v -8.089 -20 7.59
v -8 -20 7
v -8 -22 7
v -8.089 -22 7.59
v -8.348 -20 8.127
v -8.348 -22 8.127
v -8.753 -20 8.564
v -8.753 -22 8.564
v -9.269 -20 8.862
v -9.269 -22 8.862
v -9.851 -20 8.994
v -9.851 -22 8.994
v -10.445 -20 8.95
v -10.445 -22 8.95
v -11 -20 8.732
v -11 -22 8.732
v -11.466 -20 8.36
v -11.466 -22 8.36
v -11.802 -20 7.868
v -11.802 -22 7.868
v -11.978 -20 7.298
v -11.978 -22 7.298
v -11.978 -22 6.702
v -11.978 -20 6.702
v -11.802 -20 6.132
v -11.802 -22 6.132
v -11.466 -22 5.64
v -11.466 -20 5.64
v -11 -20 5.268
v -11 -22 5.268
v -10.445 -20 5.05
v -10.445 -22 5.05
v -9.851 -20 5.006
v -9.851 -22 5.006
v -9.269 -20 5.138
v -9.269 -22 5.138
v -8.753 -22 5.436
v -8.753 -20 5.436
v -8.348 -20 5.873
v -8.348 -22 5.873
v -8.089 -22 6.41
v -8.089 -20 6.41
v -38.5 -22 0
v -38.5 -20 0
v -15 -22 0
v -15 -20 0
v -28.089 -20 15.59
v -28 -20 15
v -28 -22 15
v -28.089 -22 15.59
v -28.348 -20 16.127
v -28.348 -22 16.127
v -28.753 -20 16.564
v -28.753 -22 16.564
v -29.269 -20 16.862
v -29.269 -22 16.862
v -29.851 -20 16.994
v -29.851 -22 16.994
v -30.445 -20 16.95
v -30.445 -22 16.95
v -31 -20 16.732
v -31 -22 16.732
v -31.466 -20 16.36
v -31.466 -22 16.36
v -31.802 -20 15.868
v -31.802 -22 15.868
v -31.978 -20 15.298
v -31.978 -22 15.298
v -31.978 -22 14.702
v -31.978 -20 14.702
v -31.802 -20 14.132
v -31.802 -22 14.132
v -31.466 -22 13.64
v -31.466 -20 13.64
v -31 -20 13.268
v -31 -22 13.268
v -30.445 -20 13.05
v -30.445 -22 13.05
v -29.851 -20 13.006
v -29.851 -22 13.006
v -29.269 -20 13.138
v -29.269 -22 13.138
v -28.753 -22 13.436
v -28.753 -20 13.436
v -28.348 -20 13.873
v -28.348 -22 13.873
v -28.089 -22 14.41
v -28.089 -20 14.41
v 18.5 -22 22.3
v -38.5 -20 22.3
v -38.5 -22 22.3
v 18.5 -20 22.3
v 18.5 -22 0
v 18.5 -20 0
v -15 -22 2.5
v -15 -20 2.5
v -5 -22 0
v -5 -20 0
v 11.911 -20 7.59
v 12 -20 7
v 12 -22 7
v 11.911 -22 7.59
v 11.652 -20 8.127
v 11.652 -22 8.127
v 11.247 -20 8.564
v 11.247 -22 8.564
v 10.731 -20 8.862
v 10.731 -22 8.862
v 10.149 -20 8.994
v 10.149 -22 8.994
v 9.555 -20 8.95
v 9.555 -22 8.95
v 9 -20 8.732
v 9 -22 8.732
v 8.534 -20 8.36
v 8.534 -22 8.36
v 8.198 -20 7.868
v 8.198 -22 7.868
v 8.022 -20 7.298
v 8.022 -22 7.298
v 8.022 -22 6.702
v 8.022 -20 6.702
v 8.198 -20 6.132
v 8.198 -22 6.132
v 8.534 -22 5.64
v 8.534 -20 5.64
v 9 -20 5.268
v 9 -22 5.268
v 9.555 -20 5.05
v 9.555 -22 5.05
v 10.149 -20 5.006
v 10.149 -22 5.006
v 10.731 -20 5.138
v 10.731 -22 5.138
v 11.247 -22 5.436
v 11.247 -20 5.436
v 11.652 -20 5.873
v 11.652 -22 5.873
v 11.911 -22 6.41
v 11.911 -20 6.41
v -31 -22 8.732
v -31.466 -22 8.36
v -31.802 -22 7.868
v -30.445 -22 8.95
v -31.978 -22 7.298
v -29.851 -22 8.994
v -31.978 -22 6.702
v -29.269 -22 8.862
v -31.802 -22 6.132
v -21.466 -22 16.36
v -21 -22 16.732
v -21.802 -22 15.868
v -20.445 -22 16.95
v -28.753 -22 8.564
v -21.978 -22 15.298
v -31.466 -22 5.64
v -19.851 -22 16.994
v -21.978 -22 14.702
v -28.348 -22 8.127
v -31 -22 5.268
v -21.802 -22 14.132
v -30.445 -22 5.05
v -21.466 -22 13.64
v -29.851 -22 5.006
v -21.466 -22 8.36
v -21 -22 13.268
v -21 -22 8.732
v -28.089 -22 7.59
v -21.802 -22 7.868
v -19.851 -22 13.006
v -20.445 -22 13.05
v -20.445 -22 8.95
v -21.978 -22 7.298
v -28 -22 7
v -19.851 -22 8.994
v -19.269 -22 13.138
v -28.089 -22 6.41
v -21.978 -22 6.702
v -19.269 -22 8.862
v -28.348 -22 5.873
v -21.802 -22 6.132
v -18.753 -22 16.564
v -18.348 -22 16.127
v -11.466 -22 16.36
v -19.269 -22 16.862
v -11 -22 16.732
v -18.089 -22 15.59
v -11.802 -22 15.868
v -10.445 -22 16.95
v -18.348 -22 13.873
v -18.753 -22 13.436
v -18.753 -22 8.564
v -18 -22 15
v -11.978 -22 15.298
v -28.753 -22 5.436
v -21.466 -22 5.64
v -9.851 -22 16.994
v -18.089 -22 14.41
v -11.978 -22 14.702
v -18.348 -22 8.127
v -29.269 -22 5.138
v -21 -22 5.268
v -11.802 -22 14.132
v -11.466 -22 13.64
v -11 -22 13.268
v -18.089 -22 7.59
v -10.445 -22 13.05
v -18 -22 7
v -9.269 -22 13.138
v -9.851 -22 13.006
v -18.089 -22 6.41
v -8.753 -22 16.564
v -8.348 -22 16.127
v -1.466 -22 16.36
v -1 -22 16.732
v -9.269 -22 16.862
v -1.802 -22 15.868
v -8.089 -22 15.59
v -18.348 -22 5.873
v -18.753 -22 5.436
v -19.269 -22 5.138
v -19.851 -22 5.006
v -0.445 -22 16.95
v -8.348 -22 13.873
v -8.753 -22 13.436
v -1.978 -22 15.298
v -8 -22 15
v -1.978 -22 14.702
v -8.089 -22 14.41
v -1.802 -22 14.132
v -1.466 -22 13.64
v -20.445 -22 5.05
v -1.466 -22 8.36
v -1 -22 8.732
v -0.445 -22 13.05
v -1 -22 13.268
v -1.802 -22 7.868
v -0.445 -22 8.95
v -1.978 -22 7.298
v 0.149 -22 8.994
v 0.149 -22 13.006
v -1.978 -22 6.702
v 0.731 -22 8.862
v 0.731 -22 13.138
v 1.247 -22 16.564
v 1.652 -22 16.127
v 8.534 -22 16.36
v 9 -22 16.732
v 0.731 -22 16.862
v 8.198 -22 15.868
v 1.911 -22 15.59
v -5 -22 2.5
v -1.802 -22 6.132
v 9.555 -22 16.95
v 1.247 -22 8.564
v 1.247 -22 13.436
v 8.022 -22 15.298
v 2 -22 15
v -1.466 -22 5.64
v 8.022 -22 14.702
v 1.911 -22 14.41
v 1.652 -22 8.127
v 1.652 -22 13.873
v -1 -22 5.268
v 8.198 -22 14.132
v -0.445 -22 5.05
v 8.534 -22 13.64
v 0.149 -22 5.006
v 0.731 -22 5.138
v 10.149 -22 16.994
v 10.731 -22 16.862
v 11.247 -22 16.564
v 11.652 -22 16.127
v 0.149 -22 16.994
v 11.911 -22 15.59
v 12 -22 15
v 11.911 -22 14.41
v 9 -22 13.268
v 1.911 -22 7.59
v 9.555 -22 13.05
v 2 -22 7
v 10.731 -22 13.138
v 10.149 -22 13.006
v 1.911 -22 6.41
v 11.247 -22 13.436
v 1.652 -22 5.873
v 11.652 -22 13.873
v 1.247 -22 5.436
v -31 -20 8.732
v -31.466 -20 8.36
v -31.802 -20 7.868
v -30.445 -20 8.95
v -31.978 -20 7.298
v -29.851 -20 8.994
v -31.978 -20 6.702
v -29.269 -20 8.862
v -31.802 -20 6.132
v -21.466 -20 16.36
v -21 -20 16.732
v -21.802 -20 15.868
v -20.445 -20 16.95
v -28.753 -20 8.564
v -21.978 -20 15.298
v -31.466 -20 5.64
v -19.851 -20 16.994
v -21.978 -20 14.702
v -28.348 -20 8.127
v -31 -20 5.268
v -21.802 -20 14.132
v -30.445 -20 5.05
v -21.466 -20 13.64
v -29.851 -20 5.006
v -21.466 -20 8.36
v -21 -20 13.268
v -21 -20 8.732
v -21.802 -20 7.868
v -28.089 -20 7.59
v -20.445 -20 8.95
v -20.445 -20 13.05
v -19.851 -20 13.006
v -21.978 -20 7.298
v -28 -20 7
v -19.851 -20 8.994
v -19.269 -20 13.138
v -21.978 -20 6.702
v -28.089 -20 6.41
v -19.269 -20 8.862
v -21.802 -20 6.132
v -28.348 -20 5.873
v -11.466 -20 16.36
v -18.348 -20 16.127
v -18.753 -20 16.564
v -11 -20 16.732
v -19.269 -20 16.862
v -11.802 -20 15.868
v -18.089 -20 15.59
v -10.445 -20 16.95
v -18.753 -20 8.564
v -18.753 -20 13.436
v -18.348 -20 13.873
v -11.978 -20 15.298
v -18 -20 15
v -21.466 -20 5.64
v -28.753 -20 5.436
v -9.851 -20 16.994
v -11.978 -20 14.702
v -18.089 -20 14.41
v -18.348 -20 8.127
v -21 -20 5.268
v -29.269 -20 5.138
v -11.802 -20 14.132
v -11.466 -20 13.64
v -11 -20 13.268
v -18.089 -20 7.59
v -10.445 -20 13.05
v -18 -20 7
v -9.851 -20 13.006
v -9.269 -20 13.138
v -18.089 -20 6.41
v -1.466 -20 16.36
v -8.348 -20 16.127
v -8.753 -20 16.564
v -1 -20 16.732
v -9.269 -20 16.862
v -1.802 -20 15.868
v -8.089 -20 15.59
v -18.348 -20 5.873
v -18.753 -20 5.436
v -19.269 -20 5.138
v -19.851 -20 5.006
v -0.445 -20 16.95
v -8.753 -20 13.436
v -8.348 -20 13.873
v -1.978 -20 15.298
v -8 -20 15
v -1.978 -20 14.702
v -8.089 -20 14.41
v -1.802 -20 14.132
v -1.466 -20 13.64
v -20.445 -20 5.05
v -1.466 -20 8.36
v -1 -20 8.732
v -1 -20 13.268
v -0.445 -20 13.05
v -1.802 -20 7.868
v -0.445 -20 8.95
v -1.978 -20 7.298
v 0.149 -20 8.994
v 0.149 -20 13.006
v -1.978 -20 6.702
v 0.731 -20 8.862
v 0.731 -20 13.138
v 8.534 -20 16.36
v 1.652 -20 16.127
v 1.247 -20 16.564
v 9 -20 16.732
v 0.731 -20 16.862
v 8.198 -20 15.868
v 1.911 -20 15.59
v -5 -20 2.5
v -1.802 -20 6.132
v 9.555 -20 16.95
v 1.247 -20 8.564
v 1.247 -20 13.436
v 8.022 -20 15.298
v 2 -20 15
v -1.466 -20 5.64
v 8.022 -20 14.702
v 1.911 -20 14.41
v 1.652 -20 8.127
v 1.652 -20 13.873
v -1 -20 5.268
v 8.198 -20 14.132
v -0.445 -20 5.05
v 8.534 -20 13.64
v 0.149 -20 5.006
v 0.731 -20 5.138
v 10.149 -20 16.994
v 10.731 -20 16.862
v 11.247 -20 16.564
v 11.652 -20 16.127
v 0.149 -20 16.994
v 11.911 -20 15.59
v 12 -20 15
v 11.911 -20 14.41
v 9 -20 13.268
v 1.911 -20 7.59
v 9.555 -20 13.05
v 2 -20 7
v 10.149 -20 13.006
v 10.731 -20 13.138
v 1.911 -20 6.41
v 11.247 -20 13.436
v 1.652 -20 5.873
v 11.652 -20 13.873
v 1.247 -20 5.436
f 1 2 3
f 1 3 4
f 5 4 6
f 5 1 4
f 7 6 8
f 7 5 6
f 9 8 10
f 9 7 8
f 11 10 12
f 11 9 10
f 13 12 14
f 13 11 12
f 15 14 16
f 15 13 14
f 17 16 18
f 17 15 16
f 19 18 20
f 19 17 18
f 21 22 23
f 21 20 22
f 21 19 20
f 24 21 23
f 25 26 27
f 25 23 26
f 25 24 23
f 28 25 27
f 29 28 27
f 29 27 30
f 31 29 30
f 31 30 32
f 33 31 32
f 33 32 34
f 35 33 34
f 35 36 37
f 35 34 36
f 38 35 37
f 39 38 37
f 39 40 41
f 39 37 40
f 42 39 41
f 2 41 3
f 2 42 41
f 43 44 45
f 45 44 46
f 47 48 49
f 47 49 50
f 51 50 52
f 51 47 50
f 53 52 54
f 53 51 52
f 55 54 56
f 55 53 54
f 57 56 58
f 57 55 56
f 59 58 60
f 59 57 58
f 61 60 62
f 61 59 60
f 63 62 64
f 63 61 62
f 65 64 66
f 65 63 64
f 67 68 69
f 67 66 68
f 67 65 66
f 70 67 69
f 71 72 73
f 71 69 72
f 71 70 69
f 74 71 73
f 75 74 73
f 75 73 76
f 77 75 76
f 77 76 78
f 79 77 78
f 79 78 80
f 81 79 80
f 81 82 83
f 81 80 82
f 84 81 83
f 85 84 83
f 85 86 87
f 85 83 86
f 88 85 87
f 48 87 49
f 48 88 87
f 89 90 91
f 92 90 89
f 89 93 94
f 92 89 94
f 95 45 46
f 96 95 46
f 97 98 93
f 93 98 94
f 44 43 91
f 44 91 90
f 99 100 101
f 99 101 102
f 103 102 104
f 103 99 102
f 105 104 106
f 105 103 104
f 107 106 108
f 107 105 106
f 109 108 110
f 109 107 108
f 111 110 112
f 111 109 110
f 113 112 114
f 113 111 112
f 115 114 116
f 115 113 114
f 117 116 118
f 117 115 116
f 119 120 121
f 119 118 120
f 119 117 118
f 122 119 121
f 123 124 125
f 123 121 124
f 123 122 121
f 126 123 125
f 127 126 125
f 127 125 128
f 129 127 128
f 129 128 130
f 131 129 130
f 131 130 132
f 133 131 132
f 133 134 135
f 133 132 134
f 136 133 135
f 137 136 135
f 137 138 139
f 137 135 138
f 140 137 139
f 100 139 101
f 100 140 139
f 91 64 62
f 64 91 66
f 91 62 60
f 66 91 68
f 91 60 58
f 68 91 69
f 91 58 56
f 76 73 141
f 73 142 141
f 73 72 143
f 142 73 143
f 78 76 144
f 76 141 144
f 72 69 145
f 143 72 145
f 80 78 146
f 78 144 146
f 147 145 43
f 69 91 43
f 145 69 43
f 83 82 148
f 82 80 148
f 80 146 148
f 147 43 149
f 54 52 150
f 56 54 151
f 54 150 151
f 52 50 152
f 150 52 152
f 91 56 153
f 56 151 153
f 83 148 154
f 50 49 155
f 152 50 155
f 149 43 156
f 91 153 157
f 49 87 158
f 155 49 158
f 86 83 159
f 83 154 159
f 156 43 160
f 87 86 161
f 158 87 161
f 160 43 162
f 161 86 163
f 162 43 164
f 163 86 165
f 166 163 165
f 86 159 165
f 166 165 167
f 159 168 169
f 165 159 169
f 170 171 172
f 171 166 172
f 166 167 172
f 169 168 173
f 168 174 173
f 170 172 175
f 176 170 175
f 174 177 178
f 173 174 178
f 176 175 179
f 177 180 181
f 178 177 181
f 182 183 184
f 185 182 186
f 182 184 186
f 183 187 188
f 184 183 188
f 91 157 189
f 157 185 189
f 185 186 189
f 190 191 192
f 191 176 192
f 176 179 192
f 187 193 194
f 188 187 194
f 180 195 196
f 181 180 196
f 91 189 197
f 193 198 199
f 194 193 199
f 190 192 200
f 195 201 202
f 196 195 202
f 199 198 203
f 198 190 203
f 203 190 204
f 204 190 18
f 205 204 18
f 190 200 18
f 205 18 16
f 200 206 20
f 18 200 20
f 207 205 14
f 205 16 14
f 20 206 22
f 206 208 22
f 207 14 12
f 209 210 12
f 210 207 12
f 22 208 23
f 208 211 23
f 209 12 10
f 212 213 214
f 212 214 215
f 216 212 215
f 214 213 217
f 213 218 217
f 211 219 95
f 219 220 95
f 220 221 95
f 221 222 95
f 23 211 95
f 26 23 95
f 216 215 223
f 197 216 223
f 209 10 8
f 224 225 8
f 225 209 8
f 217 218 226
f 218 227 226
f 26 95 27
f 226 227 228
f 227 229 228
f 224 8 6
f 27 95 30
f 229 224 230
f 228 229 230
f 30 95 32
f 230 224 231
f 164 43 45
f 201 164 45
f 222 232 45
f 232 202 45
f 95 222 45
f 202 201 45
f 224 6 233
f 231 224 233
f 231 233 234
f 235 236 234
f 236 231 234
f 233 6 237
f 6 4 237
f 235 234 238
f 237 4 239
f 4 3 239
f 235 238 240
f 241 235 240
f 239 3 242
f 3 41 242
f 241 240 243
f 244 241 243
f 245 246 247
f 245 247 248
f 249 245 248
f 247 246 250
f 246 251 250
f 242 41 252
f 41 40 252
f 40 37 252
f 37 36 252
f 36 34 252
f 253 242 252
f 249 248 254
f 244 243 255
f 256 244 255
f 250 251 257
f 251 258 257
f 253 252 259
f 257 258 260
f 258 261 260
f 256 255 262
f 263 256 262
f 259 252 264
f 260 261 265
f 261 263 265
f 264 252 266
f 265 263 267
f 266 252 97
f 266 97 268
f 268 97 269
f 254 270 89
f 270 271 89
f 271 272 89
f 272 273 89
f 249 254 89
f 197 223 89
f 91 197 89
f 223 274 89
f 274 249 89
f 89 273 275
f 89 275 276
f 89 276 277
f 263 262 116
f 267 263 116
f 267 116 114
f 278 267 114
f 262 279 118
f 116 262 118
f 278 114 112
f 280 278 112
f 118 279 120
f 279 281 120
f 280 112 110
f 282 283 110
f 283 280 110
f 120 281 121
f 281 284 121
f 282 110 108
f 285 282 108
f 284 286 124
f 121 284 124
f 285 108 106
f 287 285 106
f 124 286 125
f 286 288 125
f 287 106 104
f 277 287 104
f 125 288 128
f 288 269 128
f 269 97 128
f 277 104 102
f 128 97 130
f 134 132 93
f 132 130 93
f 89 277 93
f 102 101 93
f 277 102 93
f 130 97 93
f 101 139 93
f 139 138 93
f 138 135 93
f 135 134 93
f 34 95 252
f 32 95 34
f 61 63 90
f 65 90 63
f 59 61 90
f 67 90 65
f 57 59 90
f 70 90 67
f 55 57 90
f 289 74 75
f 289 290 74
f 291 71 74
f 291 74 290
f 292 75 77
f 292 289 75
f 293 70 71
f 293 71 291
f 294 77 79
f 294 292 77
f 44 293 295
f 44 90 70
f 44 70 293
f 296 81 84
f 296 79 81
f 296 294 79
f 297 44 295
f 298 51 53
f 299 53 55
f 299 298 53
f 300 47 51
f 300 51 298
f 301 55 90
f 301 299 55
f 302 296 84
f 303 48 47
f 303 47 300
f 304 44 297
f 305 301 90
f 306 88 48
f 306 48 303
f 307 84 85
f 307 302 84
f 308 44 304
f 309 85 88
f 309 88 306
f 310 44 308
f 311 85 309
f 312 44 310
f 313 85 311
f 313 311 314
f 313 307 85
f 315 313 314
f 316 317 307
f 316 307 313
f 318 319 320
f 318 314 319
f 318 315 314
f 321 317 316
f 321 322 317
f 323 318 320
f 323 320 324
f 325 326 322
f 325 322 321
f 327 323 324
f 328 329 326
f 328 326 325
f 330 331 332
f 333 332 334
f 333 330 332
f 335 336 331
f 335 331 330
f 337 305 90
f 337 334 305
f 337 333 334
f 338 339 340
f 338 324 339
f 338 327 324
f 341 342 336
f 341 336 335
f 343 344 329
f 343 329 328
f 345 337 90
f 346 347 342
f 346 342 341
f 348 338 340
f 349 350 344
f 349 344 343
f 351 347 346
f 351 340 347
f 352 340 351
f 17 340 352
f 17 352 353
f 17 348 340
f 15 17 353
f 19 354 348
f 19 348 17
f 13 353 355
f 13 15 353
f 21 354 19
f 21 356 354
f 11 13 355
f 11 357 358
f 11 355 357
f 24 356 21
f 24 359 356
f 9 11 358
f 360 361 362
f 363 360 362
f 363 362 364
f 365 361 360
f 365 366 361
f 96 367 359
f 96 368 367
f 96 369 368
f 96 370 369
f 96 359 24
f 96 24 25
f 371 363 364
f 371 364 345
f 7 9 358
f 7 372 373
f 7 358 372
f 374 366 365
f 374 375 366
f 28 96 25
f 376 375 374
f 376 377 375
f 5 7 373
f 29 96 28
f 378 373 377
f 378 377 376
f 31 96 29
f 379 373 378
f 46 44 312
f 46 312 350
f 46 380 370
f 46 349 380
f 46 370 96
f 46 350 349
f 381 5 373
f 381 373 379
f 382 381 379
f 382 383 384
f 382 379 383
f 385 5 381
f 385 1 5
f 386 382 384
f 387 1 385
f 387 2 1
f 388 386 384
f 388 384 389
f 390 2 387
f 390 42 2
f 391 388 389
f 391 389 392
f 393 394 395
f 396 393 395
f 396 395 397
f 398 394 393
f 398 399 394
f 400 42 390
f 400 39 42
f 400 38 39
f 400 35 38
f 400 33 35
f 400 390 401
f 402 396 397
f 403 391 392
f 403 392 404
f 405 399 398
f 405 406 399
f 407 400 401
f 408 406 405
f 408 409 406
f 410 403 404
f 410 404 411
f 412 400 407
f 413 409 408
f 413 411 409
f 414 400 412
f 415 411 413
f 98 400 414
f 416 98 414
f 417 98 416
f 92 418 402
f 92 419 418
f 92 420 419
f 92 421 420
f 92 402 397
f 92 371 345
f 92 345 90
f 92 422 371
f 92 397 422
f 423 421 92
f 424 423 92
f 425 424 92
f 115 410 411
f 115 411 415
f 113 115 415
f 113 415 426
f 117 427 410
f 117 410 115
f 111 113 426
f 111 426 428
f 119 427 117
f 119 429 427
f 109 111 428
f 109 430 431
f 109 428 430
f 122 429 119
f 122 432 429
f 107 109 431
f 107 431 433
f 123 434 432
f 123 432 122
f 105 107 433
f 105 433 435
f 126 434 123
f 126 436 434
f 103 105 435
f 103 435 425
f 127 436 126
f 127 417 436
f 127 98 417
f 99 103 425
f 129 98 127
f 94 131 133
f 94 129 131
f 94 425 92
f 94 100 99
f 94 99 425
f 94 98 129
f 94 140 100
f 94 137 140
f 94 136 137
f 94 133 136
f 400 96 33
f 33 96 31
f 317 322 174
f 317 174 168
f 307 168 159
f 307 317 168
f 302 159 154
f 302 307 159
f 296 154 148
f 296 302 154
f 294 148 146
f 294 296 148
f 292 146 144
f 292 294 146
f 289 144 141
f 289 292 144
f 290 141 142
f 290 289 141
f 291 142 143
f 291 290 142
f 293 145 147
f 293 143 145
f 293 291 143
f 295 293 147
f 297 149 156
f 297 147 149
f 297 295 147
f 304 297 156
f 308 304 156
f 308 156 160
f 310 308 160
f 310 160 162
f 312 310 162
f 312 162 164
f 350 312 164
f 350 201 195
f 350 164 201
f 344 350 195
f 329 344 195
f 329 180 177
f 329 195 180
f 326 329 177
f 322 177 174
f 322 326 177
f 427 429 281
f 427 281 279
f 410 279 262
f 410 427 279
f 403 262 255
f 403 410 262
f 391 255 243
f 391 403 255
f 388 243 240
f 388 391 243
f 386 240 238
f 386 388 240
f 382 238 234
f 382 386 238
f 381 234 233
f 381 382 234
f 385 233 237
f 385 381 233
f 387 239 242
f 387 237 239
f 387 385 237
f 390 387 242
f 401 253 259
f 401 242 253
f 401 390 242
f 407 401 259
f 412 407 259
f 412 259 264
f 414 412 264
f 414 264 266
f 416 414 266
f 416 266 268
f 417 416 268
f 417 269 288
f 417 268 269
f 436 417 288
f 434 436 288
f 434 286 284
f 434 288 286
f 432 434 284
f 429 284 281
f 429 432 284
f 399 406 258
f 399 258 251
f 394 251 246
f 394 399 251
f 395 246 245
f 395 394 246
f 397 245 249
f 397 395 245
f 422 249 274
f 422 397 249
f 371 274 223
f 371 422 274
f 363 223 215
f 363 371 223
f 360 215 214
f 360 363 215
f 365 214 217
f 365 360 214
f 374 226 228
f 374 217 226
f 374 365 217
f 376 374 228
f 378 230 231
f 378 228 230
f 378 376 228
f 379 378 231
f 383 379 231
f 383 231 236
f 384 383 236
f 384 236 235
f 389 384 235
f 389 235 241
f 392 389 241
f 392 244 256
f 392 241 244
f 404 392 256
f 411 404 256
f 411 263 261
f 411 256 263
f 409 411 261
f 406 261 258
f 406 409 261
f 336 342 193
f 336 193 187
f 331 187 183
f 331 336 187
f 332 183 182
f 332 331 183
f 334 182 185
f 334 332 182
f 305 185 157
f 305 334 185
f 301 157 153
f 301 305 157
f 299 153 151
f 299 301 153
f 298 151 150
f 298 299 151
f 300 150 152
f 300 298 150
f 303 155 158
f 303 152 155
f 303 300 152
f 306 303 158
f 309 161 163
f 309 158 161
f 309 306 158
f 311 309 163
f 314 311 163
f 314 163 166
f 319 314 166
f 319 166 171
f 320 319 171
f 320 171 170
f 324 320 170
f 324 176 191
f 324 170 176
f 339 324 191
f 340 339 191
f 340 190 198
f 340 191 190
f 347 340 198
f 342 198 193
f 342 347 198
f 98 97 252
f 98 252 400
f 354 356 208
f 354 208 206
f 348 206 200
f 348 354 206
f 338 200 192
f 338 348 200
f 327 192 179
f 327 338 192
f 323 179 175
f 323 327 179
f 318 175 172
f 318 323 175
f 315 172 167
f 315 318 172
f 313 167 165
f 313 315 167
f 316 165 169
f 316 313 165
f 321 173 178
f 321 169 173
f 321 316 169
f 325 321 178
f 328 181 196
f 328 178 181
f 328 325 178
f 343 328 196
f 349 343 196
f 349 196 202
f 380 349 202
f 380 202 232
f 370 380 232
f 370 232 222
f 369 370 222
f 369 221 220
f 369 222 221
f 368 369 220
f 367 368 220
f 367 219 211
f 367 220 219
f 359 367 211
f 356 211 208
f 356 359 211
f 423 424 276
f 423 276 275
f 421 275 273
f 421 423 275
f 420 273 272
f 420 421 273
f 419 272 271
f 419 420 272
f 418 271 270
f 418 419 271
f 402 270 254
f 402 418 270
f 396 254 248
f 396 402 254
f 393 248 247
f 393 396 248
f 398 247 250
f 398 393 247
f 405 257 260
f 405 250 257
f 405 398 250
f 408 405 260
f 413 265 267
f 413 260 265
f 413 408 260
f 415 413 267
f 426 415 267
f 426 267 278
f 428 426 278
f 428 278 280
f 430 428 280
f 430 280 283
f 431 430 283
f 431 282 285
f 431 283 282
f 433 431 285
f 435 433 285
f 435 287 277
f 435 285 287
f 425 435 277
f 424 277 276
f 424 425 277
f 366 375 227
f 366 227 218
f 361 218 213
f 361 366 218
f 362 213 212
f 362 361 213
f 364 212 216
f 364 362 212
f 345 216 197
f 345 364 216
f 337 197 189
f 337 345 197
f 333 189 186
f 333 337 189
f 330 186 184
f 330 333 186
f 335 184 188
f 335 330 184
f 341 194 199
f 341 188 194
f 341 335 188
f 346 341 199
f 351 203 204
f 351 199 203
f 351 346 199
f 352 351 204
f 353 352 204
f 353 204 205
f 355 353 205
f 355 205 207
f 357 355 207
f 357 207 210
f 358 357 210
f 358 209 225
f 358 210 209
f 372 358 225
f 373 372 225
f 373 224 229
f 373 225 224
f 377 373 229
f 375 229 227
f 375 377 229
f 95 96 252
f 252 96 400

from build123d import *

# Parameters (mm, degrees)
BOX002_W          = 10
BOX002_H          = 8
BOX002_DEPTH      = 5
CYLINDER003_R     = 2
CYLINDER003_DEPTH = 10
ARRAY003_X_COUNT  = 5
ARRAY003_X_PITCH  = 10
ARRAY003_Z_COUNT  = 2
ARRAY003_Z_PITCH  = 8
BOX001_W          = 57
BOX001_H          = 2
BOX001_DEPTH      = 22.3


with BuildPart() as cube:
    # Box002 → Box002 (new body)
    with BuildSketch(Plane(origin=(-15, -27, -2.5), x_dir=(1, 0, 0), z_dir=(0, 0, 1))):
        with Locations((5, 4)):
            Rectangle(BOX002_W, BOX002_H)
    extrude(amount=BOX002_DEPTH)


with BuildPart() as array003:
    # Cylinder003 → Cylinder003 (new body)
    with BuildSketch(Plane(origin=(-30, -16, 7), x_dir=(1, 0, 0), z_dir=(0, -1, 0))):
        Circle(CYLINDER003_R)
    extrude(amount=CYLINDER003_DEPTH)

    # Array003 X: Array003 ×5


with BuildPart() as array003_1:
    add(array003.part)
    with Locations(*[(i * ARRAY003_X_PITCH, 0, 0) for i in range(1, ARRAY003_X_COUNT)]):
        add(array003.part)

    # Array003 Z: Array003 ×2


with BuildPart() as array003_2:
    add(array003_1.part)
    with Locations(*[(0, 0, i * ARRAY003_Z_PITCH) for i in range(1, ARRAY003_Z_COUNT)]):
        add(array003_1.part)


with BuildPart() as cut006:
    # Box001 → Box001 (new body)
    with BuildSketch(Plane(origin=(-38.5, -22, 0), x_dir=(1, 0, 0), z_dir=(0, 0, 1))):
        with Locations((28.5, 1)):
            Rectangle(BOX001_W, BOX001_H)
    extrude(amount=BOX001_DEPTH)

    # Cut005: cut Array003
    add(array003_2.part, mode=Mode.SUBTRACT)

    # Cut006: cut Cube
    add(cube.part, mode=Mode.SUBTRACT)


solid = cut006.part
